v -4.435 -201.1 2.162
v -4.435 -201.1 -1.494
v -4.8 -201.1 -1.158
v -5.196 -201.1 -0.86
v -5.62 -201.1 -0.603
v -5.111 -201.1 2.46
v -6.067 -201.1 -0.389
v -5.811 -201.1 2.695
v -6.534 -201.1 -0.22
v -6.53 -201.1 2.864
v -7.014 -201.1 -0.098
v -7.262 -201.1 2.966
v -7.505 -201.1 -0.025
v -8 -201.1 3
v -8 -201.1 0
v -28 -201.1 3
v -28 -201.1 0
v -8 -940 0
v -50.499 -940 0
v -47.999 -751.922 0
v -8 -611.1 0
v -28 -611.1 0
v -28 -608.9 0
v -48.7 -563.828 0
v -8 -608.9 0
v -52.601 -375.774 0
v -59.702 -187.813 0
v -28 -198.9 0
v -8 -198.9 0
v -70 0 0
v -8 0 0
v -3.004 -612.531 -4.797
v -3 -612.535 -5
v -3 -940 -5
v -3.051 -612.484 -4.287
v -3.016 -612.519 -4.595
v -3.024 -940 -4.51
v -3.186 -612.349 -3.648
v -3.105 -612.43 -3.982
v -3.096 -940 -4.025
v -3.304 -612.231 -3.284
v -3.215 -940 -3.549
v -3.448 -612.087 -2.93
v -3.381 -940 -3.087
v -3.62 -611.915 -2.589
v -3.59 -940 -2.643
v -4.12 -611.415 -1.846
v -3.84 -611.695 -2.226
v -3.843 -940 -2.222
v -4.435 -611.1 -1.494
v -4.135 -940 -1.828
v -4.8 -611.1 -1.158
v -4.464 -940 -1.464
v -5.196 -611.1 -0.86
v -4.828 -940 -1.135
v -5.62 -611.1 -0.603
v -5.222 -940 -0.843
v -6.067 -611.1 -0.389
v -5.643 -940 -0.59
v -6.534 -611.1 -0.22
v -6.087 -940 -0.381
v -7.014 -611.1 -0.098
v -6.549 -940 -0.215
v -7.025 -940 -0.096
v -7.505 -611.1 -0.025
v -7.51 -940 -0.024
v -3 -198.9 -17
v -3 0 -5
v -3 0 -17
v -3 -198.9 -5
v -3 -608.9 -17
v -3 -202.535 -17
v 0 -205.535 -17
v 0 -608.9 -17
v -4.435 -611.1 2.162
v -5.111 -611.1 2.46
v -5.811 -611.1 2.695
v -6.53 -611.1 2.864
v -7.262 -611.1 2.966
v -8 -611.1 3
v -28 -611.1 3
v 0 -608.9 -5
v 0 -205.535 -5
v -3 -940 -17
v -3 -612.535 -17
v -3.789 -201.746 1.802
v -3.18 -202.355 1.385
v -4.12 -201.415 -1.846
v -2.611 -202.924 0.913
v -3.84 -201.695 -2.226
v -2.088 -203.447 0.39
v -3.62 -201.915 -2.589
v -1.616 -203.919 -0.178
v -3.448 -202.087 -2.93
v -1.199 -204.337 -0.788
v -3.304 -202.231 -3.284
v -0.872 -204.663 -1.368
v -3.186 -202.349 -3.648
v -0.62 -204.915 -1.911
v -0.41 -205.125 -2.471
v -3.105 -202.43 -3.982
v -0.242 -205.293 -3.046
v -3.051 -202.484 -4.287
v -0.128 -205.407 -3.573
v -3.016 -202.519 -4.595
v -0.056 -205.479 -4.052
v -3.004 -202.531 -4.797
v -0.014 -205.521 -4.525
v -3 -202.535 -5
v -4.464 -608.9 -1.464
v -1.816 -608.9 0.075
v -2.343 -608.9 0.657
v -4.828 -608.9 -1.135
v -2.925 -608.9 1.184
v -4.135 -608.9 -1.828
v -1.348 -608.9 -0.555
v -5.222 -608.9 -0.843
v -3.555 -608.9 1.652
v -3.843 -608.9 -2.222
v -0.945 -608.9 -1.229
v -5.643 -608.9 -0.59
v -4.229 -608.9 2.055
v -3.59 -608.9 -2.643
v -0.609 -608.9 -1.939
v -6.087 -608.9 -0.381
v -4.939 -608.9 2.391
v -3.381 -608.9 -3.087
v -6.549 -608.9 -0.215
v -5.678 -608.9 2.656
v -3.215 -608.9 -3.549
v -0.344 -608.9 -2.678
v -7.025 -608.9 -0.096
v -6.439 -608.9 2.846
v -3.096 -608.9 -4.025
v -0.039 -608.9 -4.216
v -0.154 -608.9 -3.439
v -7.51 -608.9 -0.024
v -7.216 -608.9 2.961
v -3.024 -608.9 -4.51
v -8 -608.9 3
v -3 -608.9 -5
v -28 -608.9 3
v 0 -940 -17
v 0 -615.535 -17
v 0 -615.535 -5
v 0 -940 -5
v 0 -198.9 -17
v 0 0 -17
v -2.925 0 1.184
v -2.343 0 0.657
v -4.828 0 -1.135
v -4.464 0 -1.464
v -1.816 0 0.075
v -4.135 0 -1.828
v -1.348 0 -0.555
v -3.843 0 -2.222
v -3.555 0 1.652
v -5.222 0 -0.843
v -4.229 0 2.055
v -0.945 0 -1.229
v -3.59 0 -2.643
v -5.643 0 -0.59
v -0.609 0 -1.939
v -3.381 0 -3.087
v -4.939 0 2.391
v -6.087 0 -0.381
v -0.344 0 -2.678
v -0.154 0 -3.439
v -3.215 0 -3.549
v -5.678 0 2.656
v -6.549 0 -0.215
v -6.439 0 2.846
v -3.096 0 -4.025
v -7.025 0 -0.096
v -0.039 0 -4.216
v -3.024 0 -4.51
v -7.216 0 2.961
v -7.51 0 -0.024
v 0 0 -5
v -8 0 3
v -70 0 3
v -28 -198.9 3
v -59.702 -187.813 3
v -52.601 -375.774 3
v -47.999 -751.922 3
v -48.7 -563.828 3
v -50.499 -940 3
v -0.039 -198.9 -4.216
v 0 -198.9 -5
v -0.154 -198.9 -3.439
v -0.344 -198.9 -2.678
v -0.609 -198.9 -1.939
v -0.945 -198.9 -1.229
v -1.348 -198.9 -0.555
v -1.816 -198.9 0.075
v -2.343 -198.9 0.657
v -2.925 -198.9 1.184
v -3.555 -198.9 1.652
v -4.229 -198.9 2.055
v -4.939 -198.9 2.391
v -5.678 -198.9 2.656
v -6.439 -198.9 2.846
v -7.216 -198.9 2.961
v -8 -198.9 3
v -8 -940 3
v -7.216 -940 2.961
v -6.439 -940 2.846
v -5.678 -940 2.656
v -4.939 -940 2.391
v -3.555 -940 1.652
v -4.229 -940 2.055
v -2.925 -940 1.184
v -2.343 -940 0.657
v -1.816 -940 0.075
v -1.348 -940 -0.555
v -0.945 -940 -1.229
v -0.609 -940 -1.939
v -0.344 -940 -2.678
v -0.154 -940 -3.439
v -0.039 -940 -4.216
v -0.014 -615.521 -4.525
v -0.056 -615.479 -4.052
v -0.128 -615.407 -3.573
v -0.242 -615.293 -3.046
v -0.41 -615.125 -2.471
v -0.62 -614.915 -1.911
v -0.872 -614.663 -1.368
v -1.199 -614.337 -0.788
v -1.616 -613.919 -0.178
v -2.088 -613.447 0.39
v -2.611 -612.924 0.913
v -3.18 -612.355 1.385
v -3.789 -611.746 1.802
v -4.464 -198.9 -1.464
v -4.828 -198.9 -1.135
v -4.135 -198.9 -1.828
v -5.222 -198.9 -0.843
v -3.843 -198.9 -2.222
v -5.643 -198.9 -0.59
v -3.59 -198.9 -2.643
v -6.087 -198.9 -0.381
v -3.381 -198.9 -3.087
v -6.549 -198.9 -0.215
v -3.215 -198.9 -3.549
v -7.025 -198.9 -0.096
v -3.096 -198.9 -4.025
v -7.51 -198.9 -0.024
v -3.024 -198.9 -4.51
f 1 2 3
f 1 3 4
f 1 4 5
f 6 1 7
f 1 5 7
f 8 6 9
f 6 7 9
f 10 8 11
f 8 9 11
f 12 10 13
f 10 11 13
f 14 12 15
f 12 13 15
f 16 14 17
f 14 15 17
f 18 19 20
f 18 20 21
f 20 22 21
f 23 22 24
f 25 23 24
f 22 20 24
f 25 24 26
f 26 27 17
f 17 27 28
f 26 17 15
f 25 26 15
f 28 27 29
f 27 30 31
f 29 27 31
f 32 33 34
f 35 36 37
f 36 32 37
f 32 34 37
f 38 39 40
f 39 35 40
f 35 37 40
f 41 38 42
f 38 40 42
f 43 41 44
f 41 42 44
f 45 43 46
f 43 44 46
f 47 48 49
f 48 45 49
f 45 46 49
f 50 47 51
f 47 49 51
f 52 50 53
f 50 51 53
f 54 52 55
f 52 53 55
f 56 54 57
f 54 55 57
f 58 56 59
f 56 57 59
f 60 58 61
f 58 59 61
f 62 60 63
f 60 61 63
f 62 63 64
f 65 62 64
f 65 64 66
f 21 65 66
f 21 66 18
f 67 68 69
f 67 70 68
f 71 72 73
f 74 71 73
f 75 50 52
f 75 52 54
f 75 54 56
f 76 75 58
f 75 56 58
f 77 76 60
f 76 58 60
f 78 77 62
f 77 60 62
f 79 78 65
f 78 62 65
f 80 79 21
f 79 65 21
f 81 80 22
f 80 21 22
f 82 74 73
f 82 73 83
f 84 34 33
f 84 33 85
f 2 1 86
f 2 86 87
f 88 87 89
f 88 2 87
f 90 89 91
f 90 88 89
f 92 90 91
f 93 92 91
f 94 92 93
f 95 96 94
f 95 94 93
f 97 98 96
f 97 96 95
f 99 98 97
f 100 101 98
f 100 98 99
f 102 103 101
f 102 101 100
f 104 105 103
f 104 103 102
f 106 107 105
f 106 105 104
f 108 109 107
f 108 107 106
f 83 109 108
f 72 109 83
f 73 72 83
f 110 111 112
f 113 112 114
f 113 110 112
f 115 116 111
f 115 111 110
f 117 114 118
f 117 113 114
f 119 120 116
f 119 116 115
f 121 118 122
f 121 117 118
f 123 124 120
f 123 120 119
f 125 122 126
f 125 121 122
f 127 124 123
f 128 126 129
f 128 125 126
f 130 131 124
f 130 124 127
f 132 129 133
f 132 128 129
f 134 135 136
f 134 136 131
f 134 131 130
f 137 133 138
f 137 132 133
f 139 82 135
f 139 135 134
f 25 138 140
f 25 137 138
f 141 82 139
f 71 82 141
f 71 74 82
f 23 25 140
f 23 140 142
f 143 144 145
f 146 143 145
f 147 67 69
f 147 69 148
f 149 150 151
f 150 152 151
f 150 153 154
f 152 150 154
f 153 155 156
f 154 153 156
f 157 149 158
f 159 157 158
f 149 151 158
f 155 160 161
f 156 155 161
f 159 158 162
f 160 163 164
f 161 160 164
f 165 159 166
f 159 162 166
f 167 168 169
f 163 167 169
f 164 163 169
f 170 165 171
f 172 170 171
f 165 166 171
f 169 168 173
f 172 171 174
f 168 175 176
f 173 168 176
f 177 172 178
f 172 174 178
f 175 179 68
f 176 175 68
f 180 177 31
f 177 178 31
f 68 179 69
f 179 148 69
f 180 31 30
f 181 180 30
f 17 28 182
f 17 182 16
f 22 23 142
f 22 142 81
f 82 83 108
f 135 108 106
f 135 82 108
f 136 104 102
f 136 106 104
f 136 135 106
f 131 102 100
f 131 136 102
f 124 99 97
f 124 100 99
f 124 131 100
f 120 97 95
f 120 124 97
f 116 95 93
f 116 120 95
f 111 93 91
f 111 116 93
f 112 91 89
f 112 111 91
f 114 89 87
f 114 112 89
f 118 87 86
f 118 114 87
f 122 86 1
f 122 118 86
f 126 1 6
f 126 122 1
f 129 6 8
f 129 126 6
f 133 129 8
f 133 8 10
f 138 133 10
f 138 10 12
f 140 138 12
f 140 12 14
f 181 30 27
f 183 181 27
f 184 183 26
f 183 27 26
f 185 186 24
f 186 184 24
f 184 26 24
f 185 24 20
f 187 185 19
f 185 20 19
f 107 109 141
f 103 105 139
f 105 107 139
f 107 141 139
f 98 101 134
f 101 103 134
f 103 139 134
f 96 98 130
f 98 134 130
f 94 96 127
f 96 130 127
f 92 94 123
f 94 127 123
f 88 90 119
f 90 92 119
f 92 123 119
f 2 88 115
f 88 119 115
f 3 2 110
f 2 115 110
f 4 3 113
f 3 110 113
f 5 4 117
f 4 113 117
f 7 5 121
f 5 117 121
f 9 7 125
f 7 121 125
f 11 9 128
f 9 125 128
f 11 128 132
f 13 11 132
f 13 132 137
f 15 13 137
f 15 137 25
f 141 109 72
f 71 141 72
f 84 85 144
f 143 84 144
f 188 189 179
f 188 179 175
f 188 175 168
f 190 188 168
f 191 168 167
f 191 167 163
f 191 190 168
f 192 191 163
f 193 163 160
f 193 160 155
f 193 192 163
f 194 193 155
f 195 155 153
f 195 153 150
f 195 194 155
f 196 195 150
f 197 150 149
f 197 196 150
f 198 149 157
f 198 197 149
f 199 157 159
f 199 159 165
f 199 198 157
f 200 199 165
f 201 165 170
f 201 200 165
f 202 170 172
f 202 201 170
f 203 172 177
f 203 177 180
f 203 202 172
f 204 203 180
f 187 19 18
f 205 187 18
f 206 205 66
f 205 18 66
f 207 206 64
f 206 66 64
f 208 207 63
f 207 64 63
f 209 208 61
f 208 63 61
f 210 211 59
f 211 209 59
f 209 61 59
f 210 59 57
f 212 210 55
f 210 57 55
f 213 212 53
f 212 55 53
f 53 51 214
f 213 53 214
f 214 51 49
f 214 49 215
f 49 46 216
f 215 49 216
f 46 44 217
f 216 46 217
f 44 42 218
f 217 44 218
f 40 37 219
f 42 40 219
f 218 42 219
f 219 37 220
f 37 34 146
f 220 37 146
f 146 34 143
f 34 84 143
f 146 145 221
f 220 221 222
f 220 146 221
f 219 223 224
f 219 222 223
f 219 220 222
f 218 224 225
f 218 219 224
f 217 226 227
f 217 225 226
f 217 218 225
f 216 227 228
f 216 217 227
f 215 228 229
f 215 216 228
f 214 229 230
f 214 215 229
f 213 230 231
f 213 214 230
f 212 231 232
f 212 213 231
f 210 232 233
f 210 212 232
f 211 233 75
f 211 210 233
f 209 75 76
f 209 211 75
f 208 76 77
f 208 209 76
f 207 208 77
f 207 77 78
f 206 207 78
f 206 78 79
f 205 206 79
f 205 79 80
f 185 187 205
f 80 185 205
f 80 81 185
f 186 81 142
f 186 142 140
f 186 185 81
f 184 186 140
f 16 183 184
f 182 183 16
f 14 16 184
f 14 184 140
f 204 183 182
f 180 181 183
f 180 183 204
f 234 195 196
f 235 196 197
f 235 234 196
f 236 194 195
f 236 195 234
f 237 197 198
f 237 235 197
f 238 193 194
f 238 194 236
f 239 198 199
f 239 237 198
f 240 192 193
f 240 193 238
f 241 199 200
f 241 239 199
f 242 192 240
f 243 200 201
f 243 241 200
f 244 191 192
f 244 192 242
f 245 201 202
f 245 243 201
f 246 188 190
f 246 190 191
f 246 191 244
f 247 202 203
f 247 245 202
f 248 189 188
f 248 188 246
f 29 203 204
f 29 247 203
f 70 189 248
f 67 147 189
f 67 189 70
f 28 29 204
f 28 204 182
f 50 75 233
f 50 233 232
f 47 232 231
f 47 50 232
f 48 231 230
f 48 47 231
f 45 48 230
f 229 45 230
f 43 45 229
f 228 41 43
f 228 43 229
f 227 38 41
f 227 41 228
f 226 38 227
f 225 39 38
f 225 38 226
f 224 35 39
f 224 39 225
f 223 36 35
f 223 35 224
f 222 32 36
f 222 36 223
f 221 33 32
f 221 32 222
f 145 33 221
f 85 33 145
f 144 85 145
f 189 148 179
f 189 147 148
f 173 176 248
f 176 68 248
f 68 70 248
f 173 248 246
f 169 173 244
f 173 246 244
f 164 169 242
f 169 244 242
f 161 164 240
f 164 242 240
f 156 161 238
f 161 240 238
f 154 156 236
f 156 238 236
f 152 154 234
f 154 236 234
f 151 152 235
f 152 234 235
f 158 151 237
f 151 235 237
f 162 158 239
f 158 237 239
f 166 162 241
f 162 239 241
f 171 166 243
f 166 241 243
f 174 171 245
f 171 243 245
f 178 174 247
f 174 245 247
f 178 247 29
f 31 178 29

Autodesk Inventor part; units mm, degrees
ref_plane "YZ Plane" through (0, 0, 0) normal (1, 0, 0) x (0, 1, 0)
ref_plane "XZ Plane" through (0, 0, 0) normal (0, 1, 0) x (-1, 0, 0)
ref_plane "XY Plane" through (0, 0, 0) normal (0, 0, 1) x (1, 0, 0)
sketch "Sketch1" plane through (0, 0, 0) normal (0, 0, 1) x (1, 0, 0)
  arc A0 (-97, -1740) -> (-70, 0) centre (-11100.8726, -699.0408) ccw
  line L0 (0, 0) -> (-70, 0)
  line L1 (0, -16.732) -> (-68.9524, -16.732) construction
  line L2 (0, -496.732) -> (-49.7243, -496.732) construction
  line L3 (0, -976.732) -> (-51.3615, -976.732) construction
  line L4 (0, -1456.732) -> (-73.8734, -1456.732) construction
  line L5 (-97, -1740) -> (0, -1740)
  line L6 (0, 0) -> (0, -1740)
  line L7 (0, -1730) -> (-10.3553, -1740)
  point P0 (-20, 0)
  dimension "d33" = 50
  dimension "d58" = 480
  dimension "d59" = 480
  dimension "d60" = 480
  dimension "d141" = 1740
  dimension "d148" = 70
  dimension "d149" = 11053
  dimension "d150" = 97
  dimension "d151" = 136
  dimension "d153" = 10
extrude "Plate3" add sketch "Sketch1" along normal blind 3 contours A0 L0 L6 L7 L5
sketch "Sketch3" plane through (-3, 0, 3) normal (1, 0, 0) x (0, 1, 0)
  line L0 (-1730, 0) -> (0, 0)
  line L1 (0, 0) -> (0, 20)
  line L2 (0, 20) -> (-1730, 20)
  line L3 (-1730, 20) -> (-1730, 0)
edge flange "Flange2" height 20 angle 90 thickness 3 bend radius 5 thickness toward (1, 0, 0) relief round relief width 3 relief depth 1.5 edges at (0, -865, 3) wall of the first edge with corners at (-3, -1730, 3) (-3, 0, 3) (-3, 0, -17) (-3, -1730, -17)
bend "Bend2"
corner "Corner2"
sketch "Sketch5" plane through (0, 0, 0) normal (0, 0, 1) x (1, 0, 0)
  line L0 (-8, -1737.7255) -> (-8, 0) projected
  line L1 (-70, 0) -> (-8, 0) projected
  arc A0 (-97, -1740) -> (-70, 0) centre (-11100.8726, -699.0408) ccw projected
  line L2 (0, 0) -> (0, -1730) projected
  line L3 (0, -198.9) -> (-28, -198.9)
  line L4 (0, -201.1) -> (-3, -201.1)
  line L5 (-3, -1730) -> (-3, 0) projected
  line L6 (-28, -198.9) -> (-28, -201.1)
  line L7 (0, -608.9) -> (-48.2402, -608.9) construction
  line L8 (0, -1018.9) -> (-52.5018, -1018.9) construction
  line L9 (0, -1428.9) -> (-71.9962, -1428.9) construction
  line L10 (-10.3553, -1740) -> (-97, -1740) projected
  line L11 (0, -198.9) -> (0, -218.9)
  line L12 (-3, -198.9) -> (-3, -201.1) construction
  line L13 (0, -218.9) -> (-3, -218.9)
  line L14 (-28, -198.9) -> (-59.1939, -198.9) construction
  line L15 (-28, -201.1) -> (-59.0945, -201.1) construction
  line L16 (-3, -201.1) -> (-3, -218.9)
  line L17 (-3, -201.1) -> (-28, -201.1)
  line L18 (-3, -218.9) -> (-8, -218.9)
  line L19 (-8, -1737.7255) -> (-10.3553, -1740) projected
  line L20 (-4.4351, -201.1) -> (0, -205.5351)
  line L21 (-4.4351, -201.1) -> (1.8371, -201.1) construction
  line L22 (-10.3553, -1740) -> (-10.3553, -1770)
  point P0 (0, 0)
  point P1 (845.25, -380.4205)
  point P2 (848, -380.4205)
  point P3 (-28, -200)
  point P4 (850, -410.4205)
  point P5 (-3, -198.9)
  point P6 (-3, -218.9)
  point P7 (-8, -201.1)
  point P8 (0, -205.5351)
  dimension "d69" = 1730
  dimension "d70" = 2.2
  dimension "d76" = 59.1939
  dimension "d80" = 48.2402
  dimension "d102" = 71.9962
  dimension "d104" = 52.5018
  dimension "d106" = 3
  dimension "d107" = 20
  dimension "d108" = 200
  dimension "d112" = 28
  dimension "d142" = 410
  dimension "d143" = 410
  dimension "d144" = 410
  dimension "d154" = 45
  dimension "d155" = 30
  dimension "d156" = 341.1
extrude "Extrusion2" cut sketch "Sketch5" along normal through all both and the other way through all contours L17 L6 L3 L0 | L0 L3 L5 L17 | L17 L5 L20 | L5 L4 L2 L20 | L3 L2 L4 L5
pattern_linear "Rectangular Pattern3" count 4 spacing 410 along (0, -1, 0) of "Extrusion2"
sketch "Sketch7" plane through (0, 0, 0) normal (0, 0, 1) x (1, 0, 0)
  line L0 (0, 0) -> (0, -198.9) projected
  line L1 (0, 0) -> (-100, 0)
  line L2 (-100, 0) -> (-100, -940)
  line L3 (-100, -940) -> (0, -940)
  line L4 (0, -940) -> (0, 0)
  line L5 (-100, -1740) -> (0, -1740)
  line L6 (0, -1740) -> (0, -940)
  line L7 (0, -940) -> (-100, -940)
  line L8 (-100, -940) -> (-100, -1740)
  line L9 (-97, -1740) -> (-10.3553, -1740) projected
  point P0 (-50, -1740)
  dimension "d157" = 100
  dimension "d158" = 940
extrude "Extrusion3" cut sketch "Sketch7" along normal through all both and the other way through all contours L6 L5 L8 L3
equation "\"d33\" = d25"
equation "\"БОРТ_стрингер_3_высота\" = 59"
equation "\"БОРТ_стрингер_4_высота\" = 48"
equation "\"БОРТ_стрингер_5_высота\" = 53"
equation "\"БОРТ_стрингер_6_высота\" = 72"
equation "\"d25\" = 50"
properties part number "MSC 347 RIB BOARD" material "Stainless Steel"
